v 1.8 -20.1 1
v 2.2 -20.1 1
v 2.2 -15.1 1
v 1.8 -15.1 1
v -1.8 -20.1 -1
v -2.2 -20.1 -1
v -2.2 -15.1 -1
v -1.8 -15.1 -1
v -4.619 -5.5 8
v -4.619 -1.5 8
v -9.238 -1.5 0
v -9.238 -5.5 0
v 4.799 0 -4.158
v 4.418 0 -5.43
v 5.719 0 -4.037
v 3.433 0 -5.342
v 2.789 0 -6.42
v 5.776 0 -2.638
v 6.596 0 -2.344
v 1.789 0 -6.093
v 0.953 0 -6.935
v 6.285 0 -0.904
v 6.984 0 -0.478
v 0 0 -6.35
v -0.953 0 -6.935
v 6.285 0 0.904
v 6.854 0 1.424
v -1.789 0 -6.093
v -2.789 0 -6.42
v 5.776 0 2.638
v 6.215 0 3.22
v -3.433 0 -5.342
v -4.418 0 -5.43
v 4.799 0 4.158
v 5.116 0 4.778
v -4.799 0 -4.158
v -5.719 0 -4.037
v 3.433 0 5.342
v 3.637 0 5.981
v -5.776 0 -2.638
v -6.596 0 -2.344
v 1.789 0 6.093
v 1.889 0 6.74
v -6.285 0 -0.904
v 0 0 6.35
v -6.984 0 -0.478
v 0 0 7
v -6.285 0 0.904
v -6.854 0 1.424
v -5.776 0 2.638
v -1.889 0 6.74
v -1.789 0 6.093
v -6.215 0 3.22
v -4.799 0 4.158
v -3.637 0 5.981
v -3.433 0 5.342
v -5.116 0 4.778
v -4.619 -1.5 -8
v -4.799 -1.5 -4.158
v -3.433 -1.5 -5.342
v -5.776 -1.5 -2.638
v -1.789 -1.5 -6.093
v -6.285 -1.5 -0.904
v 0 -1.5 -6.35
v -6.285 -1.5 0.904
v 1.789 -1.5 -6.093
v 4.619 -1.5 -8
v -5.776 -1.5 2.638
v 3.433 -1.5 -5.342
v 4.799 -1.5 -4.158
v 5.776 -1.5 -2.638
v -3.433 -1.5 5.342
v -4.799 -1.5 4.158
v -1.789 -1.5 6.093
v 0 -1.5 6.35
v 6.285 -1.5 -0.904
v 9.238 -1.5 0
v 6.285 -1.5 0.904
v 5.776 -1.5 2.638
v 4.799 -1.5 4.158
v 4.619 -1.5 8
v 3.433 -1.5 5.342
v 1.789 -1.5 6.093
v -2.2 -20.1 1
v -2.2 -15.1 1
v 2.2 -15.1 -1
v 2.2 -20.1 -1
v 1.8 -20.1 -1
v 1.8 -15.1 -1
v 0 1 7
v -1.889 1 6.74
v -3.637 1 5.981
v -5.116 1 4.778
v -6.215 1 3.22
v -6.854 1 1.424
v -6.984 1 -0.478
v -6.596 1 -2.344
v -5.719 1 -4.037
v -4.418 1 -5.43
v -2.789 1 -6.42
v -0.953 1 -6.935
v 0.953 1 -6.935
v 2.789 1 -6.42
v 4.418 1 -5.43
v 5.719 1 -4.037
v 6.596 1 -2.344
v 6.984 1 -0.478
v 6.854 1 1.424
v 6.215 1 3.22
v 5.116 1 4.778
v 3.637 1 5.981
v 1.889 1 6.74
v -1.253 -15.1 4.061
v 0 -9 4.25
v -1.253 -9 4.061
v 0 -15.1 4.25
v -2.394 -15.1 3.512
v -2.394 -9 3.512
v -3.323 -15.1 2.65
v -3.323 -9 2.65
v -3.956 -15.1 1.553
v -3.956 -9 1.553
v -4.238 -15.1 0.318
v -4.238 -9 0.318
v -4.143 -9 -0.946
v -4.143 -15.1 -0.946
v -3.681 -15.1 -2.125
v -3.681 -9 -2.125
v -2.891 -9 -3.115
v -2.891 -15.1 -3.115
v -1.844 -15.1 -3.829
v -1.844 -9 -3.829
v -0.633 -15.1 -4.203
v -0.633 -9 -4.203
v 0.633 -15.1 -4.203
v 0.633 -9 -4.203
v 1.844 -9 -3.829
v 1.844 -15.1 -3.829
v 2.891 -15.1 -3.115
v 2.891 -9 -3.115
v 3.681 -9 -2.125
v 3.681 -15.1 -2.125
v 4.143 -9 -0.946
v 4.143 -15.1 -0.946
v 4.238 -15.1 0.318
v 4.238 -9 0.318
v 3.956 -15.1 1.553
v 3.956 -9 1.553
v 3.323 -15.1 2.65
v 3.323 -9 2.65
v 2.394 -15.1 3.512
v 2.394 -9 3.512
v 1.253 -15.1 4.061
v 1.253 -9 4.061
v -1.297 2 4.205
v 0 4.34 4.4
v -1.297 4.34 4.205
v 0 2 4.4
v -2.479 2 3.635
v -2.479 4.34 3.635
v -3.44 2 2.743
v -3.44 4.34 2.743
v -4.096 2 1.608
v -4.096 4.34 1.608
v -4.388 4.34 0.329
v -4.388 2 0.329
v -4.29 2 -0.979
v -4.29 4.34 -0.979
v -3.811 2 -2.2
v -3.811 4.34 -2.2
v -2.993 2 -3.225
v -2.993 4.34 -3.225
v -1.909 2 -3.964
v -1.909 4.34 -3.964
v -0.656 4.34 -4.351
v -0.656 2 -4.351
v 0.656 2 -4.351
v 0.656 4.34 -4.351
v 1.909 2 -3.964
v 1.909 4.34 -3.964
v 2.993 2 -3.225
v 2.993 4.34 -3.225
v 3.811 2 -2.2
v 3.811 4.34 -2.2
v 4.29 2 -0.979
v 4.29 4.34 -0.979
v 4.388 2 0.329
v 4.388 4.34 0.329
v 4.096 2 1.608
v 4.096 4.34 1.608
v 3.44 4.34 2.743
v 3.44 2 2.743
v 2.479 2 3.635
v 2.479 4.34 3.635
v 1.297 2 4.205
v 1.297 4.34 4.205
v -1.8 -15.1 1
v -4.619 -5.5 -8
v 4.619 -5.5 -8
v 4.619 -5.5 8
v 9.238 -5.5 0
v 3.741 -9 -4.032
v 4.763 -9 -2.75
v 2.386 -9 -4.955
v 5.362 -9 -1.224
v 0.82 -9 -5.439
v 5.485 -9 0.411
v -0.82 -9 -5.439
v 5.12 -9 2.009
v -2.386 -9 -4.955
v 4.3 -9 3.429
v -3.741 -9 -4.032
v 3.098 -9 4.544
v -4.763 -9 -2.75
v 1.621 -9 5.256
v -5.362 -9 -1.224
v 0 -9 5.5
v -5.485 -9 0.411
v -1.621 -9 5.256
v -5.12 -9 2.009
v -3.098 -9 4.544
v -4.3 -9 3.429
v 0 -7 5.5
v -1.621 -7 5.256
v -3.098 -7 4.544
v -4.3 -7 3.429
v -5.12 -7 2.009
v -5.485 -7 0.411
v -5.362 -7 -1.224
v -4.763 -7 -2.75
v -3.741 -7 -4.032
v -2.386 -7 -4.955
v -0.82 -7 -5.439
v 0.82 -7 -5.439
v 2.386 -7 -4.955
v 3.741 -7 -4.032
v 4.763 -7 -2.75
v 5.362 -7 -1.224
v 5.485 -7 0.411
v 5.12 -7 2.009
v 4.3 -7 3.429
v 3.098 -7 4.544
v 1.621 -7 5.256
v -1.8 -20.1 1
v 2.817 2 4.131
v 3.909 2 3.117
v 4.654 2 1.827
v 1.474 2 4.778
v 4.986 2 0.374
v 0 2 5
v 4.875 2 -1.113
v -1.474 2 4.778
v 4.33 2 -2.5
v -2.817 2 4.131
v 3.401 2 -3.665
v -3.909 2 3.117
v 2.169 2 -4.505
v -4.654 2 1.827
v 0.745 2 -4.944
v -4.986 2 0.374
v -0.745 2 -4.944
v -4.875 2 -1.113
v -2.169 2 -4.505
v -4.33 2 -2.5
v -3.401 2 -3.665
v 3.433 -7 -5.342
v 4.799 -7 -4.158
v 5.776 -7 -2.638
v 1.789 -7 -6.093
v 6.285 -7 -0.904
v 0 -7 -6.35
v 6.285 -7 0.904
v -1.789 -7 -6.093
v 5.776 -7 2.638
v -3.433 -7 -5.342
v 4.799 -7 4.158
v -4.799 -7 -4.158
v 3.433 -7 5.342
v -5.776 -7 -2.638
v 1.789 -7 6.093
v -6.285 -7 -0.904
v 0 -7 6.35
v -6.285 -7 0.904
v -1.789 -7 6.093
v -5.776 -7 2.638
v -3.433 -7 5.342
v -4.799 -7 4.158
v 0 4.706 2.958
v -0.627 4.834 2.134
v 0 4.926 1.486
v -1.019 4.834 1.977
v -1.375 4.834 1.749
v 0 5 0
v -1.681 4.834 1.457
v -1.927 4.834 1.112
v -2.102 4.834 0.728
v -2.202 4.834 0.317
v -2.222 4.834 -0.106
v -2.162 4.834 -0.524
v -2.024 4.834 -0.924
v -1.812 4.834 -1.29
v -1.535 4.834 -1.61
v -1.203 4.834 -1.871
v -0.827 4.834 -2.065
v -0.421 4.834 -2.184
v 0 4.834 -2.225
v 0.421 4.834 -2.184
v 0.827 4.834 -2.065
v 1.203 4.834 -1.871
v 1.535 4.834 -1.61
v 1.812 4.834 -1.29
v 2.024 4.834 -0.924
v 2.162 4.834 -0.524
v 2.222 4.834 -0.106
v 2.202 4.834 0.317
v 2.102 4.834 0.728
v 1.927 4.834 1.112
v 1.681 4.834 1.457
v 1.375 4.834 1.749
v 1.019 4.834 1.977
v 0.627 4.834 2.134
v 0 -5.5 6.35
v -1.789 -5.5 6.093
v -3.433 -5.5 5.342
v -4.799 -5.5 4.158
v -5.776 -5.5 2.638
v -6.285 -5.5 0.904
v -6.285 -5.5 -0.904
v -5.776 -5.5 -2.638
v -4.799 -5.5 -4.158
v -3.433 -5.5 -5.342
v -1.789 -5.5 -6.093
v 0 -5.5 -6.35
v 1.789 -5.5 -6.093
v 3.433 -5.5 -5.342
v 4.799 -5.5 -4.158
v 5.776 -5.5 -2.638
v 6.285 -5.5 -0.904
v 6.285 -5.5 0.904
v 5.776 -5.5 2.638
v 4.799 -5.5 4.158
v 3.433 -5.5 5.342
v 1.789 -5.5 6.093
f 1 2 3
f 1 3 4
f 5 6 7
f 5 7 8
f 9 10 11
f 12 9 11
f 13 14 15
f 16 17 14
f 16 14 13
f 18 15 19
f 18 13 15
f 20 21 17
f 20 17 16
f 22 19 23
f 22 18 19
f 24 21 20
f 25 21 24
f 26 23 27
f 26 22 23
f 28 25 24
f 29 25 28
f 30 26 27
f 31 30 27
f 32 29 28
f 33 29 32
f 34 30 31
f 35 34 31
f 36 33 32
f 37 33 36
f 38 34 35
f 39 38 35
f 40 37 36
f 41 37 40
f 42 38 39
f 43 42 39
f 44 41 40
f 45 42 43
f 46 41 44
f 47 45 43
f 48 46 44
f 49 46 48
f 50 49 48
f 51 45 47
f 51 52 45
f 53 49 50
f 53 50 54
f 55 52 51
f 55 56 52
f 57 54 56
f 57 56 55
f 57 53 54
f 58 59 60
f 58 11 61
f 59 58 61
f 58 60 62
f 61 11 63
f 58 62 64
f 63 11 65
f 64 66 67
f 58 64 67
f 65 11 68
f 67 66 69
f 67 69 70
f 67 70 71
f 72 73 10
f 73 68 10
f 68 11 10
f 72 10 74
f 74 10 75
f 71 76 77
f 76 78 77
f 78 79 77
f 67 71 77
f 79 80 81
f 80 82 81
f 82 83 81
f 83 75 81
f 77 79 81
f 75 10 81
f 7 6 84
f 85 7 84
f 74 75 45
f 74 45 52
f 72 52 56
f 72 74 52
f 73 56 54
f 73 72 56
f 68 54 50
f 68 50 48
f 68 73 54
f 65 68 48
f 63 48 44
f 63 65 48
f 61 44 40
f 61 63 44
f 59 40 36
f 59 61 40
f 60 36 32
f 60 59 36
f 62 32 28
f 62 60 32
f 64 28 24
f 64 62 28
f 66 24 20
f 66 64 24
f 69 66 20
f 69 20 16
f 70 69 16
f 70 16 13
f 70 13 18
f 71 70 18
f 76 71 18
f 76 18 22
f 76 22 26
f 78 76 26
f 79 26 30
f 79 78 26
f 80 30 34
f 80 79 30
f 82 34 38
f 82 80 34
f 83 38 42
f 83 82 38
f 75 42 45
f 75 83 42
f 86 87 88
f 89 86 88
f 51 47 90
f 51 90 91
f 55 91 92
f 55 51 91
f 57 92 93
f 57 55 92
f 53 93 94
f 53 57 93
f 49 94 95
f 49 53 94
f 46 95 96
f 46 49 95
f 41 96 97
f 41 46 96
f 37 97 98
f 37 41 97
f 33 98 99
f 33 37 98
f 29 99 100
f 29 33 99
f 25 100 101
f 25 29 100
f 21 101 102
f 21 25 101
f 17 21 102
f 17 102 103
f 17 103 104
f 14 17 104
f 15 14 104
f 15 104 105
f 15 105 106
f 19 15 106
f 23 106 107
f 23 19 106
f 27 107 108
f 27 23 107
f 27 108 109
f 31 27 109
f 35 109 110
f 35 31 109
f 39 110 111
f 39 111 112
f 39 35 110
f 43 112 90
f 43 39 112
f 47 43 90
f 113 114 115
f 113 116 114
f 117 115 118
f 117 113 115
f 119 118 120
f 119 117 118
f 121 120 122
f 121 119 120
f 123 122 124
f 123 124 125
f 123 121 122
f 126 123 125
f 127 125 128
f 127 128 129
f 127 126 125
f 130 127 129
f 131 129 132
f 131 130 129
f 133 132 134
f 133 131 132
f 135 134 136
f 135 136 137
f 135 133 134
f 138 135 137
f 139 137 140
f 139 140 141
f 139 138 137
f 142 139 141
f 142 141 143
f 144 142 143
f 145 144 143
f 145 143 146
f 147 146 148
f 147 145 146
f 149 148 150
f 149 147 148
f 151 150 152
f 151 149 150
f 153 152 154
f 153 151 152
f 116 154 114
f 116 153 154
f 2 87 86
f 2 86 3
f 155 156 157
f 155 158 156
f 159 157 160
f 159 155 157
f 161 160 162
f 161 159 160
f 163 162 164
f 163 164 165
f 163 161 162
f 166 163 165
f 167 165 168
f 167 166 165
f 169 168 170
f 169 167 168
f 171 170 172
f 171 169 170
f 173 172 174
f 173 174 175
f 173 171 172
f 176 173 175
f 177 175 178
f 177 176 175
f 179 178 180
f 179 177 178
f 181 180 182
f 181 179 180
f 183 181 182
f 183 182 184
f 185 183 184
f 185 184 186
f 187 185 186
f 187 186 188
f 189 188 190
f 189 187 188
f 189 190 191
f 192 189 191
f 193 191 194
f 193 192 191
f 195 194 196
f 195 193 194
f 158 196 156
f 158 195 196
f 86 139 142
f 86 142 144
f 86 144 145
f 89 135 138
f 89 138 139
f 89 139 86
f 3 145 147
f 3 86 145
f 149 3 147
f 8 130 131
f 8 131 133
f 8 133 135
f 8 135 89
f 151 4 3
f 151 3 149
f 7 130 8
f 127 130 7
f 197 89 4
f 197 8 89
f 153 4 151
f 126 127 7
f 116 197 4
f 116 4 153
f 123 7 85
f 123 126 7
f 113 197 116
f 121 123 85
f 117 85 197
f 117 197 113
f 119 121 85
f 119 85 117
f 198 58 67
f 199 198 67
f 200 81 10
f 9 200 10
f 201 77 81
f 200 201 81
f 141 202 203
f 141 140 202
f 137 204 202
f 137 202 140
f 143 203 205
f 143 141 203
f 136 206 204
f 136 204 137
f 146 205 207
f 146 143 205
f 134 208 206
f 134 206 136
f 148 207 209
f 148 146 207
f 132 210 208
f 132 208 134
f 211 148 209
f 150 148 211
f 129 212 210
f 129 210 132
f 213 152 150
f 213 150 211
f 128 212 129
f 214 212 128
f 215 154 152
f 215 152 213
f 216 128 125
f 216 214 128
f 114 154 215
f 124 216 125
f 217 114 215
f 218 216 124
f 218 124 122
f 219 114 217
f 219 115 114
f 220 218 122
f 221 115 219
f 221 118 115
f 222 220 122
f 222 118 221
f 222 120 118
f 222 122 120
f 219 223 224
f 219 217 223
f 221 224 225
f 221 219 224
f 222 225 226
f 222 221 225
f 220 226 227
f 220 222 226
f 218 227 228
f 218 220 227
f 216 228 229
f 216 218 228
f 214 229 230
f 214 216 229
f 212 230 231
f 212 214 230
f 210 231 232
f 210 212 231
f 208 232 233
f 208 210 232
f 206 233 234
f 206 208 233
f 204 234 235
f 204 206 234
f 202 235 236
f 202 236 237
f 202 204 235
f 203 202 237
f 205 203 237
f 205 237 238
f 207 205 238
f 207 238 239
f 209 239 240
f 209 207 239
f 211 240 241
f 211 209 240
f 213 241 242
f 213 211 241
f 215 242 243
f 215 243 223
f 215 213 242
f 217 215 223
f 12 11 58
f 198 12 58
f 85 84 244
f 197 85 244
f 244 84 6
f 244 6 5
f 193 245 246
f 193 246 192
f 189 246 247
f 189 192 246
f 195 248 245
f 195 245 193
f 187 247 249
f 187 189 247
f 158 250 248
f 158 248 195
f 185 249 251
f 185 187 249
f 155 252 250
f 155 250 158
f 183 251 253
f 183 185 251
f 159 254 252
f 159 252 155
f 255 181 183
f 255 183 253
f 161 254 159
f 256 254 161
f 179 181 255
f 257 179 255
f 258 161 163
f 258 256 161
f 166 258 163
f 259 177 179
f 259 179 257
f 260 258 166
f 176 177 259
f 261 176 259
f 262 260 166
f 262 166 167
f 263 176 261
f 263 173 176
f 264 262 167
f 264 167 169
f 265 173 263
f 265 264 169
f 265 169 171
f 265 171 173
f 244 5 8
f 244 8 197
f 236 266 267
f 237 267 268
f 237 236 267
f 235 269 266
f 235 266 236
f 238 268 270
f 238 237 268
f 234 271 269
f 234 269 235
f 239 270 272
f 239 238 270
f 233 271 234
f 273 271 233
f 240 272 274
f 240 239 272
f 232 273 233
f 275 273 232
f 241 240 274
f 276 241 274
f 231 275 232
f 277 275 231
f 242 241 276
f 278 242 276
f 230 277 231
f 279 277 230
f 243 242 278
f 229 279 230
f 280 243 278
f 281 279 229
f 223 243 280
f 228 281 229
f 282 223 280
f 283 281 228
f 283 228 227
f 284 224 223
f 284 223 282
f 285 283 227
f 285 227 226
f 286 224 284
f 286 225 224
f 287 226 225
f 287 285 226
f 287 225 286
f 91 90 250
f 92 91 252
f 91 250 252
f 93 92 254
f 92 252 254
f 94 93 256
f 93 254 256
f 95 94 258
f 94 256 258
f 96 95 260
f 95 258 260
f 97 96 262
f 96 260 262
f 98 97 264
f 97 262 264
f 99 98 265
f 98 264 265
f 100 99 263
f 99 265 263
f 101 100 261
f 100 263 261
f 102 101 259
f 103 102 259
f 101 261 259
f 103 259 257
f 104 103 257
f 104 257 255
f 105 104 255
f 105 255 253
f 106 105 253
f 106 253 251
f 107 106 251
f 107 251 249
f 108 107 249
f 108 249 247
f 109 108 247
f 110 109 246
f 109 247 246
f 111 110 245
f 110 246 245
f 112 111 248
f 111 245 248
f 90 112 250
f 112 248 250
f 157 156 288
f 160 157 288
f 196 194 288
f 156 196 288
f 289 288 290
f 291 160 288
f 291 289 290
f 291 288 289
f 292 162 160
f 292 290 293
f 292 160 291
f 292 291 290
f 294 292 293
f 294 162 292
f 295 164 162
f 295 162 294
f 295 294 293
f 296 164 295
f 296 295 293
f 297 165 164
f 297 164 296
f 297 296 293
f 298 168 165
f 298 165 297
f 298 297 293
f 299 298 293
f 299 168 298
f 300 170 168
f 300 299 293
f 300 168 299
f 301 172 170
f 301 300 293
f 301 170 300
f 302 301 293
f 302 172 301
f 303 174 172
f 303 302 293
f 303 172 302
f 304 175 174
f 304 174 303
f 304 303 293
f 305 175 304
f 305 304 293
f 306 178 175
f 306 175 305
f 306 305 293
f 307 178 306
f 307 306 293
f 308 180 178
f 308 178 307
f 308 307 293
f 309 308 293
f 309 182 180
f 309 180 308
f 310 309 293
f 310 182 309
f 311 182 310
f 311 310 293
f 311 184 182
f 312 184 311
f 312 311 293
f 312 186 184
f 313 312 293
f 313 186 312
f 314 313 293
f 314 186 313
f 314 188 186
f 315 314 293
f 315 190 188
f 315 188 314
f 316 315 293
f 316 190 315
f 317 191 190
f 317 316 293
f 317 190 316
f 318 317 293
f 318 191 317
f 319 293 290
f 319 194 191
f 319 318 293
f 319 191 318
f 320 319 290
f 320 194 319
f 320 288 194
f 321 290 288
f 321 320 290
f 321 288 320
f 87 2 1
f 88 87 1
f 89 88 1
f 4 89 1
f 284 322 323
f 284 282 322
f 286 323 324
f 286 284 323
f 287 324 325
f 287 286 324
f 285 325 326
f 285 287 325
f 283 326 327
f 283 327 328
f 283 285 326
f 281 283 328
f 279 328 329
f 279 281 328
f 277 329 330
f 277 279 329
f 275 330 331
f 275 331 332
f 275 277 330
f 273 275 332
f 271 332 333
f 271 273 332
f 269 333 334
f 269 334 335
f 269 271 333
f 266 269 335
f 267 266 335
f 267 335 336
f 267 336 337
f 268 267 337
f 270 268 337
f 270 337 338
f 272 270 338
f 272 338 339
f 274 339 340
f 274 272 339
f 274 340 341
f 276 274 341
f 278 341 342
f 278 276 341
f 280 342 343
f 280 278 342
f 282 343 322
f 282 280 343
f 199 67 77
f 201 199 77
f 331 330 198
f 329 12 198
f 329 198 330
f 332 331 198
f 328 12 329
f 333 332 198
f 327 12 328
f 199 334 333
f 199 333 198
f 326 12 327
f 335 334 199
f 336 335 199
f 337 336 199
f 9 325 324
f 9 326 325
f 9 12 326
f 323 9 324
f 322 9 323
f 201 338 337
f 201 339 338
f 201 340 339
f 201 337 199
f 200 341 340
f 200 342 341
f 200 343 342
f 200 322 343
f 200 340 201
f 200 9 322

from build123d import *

# Parameters (mm, degrees)
BOSS_EXTRU_1_START = 1.5
BOSS_EXTRU_1_DEPTH = 4
CHANFREIN1_SIZE    = 1
CHANFREIN1_SIZE2   = 2
ESQUISSE3_W        = 0.4
ESQUISSE3_H        = 2
BOSS_EXTRU_2_DEPTH = 5


with BuildPart() as part:
    # Esquisse1 → Révolution1 (revolve)
    with BuildSketch(Plane.XY, mode=Mode.PRIVATE) as r_volution1_sk:
        with BuildLine():
            Line((4.4, 4.340153416), (4.4, 2))
            Line((4.4, 2), (7, 2))
            Line((7, 2), (7, 0))
            Line((7, 0), (6.35, 0))
            Line((6.35, 0), (6.35, -7))
            Line((6.35, -7), (5.5, -7))
            Line((5.5, -7), (5.5, -9))
            Line((5.5, -9), (4.25, -9))
            Line((4.25, -9), (4.25, -15.1))
            Line((4.25, -15.1), (0, -15.1))
            Line((0, -15.1), (0, 5))
            ThreePointArc((0, 5), (2.224600948, 4.834121161), (4.4, 4.340153416))
        make_face()
    revolve(r_volution1_sk.sketch.rotate(Axis((0, 15.574511932, 0), (0, -1, 0)), 90), axis=Axis((0, 15.574511932, 0), (0, -1, 0)))

    # Esquisse2 → Boss.-Extru.1 (add)
    with BuildSketch(Plane.XZ.offset(BOSS_EXTRU_1_START)):
        Polygon((4.618802154, -8), (9.237604307, 0), (4.618802154, 8), (-4.618802154, 8), (-9.237604307, 0), (-4.618802154, -8), align=None)
    extrude(amount=BOSS_EXTRU_1_DEPTH)

    # Chanfrein1
    chanfrein1_edges = [part.edges().sort_by_distance(p)[0] for p in [
        (0, 2, -7),
    ]]
    chanfrein1_side = [part.faces().sort_by_distance(p)[0] for p in [
        (0, 1, -7),
    ]]
    chamfer(chanfrein1_edges, length=CHANFREIN1_SIZE, length2=CHANFREIN1_SIZE2, reference=chanfrein1_side[0])

    # Esquisse3 → Boss.-Extru.2 (add)
    with BuildSketch(Plane.XZ.offset(15.1)):
        with Locations((-2, 0)):
            Rectangle(ESQUISSE3_W, ESQUISSE3_H)
    boss_extru_2 = extrude(amount=BOSS_EXTRU_2_DEPTH)

    # Symétrie1: Boss.-Extru.2 across plane
    add(boss_extru_2.mirror(Plane(origin=(0, 0, 0), x_dir=(0, 0, 1), z_dir=(1, 0, 0))))


solid = part.part
